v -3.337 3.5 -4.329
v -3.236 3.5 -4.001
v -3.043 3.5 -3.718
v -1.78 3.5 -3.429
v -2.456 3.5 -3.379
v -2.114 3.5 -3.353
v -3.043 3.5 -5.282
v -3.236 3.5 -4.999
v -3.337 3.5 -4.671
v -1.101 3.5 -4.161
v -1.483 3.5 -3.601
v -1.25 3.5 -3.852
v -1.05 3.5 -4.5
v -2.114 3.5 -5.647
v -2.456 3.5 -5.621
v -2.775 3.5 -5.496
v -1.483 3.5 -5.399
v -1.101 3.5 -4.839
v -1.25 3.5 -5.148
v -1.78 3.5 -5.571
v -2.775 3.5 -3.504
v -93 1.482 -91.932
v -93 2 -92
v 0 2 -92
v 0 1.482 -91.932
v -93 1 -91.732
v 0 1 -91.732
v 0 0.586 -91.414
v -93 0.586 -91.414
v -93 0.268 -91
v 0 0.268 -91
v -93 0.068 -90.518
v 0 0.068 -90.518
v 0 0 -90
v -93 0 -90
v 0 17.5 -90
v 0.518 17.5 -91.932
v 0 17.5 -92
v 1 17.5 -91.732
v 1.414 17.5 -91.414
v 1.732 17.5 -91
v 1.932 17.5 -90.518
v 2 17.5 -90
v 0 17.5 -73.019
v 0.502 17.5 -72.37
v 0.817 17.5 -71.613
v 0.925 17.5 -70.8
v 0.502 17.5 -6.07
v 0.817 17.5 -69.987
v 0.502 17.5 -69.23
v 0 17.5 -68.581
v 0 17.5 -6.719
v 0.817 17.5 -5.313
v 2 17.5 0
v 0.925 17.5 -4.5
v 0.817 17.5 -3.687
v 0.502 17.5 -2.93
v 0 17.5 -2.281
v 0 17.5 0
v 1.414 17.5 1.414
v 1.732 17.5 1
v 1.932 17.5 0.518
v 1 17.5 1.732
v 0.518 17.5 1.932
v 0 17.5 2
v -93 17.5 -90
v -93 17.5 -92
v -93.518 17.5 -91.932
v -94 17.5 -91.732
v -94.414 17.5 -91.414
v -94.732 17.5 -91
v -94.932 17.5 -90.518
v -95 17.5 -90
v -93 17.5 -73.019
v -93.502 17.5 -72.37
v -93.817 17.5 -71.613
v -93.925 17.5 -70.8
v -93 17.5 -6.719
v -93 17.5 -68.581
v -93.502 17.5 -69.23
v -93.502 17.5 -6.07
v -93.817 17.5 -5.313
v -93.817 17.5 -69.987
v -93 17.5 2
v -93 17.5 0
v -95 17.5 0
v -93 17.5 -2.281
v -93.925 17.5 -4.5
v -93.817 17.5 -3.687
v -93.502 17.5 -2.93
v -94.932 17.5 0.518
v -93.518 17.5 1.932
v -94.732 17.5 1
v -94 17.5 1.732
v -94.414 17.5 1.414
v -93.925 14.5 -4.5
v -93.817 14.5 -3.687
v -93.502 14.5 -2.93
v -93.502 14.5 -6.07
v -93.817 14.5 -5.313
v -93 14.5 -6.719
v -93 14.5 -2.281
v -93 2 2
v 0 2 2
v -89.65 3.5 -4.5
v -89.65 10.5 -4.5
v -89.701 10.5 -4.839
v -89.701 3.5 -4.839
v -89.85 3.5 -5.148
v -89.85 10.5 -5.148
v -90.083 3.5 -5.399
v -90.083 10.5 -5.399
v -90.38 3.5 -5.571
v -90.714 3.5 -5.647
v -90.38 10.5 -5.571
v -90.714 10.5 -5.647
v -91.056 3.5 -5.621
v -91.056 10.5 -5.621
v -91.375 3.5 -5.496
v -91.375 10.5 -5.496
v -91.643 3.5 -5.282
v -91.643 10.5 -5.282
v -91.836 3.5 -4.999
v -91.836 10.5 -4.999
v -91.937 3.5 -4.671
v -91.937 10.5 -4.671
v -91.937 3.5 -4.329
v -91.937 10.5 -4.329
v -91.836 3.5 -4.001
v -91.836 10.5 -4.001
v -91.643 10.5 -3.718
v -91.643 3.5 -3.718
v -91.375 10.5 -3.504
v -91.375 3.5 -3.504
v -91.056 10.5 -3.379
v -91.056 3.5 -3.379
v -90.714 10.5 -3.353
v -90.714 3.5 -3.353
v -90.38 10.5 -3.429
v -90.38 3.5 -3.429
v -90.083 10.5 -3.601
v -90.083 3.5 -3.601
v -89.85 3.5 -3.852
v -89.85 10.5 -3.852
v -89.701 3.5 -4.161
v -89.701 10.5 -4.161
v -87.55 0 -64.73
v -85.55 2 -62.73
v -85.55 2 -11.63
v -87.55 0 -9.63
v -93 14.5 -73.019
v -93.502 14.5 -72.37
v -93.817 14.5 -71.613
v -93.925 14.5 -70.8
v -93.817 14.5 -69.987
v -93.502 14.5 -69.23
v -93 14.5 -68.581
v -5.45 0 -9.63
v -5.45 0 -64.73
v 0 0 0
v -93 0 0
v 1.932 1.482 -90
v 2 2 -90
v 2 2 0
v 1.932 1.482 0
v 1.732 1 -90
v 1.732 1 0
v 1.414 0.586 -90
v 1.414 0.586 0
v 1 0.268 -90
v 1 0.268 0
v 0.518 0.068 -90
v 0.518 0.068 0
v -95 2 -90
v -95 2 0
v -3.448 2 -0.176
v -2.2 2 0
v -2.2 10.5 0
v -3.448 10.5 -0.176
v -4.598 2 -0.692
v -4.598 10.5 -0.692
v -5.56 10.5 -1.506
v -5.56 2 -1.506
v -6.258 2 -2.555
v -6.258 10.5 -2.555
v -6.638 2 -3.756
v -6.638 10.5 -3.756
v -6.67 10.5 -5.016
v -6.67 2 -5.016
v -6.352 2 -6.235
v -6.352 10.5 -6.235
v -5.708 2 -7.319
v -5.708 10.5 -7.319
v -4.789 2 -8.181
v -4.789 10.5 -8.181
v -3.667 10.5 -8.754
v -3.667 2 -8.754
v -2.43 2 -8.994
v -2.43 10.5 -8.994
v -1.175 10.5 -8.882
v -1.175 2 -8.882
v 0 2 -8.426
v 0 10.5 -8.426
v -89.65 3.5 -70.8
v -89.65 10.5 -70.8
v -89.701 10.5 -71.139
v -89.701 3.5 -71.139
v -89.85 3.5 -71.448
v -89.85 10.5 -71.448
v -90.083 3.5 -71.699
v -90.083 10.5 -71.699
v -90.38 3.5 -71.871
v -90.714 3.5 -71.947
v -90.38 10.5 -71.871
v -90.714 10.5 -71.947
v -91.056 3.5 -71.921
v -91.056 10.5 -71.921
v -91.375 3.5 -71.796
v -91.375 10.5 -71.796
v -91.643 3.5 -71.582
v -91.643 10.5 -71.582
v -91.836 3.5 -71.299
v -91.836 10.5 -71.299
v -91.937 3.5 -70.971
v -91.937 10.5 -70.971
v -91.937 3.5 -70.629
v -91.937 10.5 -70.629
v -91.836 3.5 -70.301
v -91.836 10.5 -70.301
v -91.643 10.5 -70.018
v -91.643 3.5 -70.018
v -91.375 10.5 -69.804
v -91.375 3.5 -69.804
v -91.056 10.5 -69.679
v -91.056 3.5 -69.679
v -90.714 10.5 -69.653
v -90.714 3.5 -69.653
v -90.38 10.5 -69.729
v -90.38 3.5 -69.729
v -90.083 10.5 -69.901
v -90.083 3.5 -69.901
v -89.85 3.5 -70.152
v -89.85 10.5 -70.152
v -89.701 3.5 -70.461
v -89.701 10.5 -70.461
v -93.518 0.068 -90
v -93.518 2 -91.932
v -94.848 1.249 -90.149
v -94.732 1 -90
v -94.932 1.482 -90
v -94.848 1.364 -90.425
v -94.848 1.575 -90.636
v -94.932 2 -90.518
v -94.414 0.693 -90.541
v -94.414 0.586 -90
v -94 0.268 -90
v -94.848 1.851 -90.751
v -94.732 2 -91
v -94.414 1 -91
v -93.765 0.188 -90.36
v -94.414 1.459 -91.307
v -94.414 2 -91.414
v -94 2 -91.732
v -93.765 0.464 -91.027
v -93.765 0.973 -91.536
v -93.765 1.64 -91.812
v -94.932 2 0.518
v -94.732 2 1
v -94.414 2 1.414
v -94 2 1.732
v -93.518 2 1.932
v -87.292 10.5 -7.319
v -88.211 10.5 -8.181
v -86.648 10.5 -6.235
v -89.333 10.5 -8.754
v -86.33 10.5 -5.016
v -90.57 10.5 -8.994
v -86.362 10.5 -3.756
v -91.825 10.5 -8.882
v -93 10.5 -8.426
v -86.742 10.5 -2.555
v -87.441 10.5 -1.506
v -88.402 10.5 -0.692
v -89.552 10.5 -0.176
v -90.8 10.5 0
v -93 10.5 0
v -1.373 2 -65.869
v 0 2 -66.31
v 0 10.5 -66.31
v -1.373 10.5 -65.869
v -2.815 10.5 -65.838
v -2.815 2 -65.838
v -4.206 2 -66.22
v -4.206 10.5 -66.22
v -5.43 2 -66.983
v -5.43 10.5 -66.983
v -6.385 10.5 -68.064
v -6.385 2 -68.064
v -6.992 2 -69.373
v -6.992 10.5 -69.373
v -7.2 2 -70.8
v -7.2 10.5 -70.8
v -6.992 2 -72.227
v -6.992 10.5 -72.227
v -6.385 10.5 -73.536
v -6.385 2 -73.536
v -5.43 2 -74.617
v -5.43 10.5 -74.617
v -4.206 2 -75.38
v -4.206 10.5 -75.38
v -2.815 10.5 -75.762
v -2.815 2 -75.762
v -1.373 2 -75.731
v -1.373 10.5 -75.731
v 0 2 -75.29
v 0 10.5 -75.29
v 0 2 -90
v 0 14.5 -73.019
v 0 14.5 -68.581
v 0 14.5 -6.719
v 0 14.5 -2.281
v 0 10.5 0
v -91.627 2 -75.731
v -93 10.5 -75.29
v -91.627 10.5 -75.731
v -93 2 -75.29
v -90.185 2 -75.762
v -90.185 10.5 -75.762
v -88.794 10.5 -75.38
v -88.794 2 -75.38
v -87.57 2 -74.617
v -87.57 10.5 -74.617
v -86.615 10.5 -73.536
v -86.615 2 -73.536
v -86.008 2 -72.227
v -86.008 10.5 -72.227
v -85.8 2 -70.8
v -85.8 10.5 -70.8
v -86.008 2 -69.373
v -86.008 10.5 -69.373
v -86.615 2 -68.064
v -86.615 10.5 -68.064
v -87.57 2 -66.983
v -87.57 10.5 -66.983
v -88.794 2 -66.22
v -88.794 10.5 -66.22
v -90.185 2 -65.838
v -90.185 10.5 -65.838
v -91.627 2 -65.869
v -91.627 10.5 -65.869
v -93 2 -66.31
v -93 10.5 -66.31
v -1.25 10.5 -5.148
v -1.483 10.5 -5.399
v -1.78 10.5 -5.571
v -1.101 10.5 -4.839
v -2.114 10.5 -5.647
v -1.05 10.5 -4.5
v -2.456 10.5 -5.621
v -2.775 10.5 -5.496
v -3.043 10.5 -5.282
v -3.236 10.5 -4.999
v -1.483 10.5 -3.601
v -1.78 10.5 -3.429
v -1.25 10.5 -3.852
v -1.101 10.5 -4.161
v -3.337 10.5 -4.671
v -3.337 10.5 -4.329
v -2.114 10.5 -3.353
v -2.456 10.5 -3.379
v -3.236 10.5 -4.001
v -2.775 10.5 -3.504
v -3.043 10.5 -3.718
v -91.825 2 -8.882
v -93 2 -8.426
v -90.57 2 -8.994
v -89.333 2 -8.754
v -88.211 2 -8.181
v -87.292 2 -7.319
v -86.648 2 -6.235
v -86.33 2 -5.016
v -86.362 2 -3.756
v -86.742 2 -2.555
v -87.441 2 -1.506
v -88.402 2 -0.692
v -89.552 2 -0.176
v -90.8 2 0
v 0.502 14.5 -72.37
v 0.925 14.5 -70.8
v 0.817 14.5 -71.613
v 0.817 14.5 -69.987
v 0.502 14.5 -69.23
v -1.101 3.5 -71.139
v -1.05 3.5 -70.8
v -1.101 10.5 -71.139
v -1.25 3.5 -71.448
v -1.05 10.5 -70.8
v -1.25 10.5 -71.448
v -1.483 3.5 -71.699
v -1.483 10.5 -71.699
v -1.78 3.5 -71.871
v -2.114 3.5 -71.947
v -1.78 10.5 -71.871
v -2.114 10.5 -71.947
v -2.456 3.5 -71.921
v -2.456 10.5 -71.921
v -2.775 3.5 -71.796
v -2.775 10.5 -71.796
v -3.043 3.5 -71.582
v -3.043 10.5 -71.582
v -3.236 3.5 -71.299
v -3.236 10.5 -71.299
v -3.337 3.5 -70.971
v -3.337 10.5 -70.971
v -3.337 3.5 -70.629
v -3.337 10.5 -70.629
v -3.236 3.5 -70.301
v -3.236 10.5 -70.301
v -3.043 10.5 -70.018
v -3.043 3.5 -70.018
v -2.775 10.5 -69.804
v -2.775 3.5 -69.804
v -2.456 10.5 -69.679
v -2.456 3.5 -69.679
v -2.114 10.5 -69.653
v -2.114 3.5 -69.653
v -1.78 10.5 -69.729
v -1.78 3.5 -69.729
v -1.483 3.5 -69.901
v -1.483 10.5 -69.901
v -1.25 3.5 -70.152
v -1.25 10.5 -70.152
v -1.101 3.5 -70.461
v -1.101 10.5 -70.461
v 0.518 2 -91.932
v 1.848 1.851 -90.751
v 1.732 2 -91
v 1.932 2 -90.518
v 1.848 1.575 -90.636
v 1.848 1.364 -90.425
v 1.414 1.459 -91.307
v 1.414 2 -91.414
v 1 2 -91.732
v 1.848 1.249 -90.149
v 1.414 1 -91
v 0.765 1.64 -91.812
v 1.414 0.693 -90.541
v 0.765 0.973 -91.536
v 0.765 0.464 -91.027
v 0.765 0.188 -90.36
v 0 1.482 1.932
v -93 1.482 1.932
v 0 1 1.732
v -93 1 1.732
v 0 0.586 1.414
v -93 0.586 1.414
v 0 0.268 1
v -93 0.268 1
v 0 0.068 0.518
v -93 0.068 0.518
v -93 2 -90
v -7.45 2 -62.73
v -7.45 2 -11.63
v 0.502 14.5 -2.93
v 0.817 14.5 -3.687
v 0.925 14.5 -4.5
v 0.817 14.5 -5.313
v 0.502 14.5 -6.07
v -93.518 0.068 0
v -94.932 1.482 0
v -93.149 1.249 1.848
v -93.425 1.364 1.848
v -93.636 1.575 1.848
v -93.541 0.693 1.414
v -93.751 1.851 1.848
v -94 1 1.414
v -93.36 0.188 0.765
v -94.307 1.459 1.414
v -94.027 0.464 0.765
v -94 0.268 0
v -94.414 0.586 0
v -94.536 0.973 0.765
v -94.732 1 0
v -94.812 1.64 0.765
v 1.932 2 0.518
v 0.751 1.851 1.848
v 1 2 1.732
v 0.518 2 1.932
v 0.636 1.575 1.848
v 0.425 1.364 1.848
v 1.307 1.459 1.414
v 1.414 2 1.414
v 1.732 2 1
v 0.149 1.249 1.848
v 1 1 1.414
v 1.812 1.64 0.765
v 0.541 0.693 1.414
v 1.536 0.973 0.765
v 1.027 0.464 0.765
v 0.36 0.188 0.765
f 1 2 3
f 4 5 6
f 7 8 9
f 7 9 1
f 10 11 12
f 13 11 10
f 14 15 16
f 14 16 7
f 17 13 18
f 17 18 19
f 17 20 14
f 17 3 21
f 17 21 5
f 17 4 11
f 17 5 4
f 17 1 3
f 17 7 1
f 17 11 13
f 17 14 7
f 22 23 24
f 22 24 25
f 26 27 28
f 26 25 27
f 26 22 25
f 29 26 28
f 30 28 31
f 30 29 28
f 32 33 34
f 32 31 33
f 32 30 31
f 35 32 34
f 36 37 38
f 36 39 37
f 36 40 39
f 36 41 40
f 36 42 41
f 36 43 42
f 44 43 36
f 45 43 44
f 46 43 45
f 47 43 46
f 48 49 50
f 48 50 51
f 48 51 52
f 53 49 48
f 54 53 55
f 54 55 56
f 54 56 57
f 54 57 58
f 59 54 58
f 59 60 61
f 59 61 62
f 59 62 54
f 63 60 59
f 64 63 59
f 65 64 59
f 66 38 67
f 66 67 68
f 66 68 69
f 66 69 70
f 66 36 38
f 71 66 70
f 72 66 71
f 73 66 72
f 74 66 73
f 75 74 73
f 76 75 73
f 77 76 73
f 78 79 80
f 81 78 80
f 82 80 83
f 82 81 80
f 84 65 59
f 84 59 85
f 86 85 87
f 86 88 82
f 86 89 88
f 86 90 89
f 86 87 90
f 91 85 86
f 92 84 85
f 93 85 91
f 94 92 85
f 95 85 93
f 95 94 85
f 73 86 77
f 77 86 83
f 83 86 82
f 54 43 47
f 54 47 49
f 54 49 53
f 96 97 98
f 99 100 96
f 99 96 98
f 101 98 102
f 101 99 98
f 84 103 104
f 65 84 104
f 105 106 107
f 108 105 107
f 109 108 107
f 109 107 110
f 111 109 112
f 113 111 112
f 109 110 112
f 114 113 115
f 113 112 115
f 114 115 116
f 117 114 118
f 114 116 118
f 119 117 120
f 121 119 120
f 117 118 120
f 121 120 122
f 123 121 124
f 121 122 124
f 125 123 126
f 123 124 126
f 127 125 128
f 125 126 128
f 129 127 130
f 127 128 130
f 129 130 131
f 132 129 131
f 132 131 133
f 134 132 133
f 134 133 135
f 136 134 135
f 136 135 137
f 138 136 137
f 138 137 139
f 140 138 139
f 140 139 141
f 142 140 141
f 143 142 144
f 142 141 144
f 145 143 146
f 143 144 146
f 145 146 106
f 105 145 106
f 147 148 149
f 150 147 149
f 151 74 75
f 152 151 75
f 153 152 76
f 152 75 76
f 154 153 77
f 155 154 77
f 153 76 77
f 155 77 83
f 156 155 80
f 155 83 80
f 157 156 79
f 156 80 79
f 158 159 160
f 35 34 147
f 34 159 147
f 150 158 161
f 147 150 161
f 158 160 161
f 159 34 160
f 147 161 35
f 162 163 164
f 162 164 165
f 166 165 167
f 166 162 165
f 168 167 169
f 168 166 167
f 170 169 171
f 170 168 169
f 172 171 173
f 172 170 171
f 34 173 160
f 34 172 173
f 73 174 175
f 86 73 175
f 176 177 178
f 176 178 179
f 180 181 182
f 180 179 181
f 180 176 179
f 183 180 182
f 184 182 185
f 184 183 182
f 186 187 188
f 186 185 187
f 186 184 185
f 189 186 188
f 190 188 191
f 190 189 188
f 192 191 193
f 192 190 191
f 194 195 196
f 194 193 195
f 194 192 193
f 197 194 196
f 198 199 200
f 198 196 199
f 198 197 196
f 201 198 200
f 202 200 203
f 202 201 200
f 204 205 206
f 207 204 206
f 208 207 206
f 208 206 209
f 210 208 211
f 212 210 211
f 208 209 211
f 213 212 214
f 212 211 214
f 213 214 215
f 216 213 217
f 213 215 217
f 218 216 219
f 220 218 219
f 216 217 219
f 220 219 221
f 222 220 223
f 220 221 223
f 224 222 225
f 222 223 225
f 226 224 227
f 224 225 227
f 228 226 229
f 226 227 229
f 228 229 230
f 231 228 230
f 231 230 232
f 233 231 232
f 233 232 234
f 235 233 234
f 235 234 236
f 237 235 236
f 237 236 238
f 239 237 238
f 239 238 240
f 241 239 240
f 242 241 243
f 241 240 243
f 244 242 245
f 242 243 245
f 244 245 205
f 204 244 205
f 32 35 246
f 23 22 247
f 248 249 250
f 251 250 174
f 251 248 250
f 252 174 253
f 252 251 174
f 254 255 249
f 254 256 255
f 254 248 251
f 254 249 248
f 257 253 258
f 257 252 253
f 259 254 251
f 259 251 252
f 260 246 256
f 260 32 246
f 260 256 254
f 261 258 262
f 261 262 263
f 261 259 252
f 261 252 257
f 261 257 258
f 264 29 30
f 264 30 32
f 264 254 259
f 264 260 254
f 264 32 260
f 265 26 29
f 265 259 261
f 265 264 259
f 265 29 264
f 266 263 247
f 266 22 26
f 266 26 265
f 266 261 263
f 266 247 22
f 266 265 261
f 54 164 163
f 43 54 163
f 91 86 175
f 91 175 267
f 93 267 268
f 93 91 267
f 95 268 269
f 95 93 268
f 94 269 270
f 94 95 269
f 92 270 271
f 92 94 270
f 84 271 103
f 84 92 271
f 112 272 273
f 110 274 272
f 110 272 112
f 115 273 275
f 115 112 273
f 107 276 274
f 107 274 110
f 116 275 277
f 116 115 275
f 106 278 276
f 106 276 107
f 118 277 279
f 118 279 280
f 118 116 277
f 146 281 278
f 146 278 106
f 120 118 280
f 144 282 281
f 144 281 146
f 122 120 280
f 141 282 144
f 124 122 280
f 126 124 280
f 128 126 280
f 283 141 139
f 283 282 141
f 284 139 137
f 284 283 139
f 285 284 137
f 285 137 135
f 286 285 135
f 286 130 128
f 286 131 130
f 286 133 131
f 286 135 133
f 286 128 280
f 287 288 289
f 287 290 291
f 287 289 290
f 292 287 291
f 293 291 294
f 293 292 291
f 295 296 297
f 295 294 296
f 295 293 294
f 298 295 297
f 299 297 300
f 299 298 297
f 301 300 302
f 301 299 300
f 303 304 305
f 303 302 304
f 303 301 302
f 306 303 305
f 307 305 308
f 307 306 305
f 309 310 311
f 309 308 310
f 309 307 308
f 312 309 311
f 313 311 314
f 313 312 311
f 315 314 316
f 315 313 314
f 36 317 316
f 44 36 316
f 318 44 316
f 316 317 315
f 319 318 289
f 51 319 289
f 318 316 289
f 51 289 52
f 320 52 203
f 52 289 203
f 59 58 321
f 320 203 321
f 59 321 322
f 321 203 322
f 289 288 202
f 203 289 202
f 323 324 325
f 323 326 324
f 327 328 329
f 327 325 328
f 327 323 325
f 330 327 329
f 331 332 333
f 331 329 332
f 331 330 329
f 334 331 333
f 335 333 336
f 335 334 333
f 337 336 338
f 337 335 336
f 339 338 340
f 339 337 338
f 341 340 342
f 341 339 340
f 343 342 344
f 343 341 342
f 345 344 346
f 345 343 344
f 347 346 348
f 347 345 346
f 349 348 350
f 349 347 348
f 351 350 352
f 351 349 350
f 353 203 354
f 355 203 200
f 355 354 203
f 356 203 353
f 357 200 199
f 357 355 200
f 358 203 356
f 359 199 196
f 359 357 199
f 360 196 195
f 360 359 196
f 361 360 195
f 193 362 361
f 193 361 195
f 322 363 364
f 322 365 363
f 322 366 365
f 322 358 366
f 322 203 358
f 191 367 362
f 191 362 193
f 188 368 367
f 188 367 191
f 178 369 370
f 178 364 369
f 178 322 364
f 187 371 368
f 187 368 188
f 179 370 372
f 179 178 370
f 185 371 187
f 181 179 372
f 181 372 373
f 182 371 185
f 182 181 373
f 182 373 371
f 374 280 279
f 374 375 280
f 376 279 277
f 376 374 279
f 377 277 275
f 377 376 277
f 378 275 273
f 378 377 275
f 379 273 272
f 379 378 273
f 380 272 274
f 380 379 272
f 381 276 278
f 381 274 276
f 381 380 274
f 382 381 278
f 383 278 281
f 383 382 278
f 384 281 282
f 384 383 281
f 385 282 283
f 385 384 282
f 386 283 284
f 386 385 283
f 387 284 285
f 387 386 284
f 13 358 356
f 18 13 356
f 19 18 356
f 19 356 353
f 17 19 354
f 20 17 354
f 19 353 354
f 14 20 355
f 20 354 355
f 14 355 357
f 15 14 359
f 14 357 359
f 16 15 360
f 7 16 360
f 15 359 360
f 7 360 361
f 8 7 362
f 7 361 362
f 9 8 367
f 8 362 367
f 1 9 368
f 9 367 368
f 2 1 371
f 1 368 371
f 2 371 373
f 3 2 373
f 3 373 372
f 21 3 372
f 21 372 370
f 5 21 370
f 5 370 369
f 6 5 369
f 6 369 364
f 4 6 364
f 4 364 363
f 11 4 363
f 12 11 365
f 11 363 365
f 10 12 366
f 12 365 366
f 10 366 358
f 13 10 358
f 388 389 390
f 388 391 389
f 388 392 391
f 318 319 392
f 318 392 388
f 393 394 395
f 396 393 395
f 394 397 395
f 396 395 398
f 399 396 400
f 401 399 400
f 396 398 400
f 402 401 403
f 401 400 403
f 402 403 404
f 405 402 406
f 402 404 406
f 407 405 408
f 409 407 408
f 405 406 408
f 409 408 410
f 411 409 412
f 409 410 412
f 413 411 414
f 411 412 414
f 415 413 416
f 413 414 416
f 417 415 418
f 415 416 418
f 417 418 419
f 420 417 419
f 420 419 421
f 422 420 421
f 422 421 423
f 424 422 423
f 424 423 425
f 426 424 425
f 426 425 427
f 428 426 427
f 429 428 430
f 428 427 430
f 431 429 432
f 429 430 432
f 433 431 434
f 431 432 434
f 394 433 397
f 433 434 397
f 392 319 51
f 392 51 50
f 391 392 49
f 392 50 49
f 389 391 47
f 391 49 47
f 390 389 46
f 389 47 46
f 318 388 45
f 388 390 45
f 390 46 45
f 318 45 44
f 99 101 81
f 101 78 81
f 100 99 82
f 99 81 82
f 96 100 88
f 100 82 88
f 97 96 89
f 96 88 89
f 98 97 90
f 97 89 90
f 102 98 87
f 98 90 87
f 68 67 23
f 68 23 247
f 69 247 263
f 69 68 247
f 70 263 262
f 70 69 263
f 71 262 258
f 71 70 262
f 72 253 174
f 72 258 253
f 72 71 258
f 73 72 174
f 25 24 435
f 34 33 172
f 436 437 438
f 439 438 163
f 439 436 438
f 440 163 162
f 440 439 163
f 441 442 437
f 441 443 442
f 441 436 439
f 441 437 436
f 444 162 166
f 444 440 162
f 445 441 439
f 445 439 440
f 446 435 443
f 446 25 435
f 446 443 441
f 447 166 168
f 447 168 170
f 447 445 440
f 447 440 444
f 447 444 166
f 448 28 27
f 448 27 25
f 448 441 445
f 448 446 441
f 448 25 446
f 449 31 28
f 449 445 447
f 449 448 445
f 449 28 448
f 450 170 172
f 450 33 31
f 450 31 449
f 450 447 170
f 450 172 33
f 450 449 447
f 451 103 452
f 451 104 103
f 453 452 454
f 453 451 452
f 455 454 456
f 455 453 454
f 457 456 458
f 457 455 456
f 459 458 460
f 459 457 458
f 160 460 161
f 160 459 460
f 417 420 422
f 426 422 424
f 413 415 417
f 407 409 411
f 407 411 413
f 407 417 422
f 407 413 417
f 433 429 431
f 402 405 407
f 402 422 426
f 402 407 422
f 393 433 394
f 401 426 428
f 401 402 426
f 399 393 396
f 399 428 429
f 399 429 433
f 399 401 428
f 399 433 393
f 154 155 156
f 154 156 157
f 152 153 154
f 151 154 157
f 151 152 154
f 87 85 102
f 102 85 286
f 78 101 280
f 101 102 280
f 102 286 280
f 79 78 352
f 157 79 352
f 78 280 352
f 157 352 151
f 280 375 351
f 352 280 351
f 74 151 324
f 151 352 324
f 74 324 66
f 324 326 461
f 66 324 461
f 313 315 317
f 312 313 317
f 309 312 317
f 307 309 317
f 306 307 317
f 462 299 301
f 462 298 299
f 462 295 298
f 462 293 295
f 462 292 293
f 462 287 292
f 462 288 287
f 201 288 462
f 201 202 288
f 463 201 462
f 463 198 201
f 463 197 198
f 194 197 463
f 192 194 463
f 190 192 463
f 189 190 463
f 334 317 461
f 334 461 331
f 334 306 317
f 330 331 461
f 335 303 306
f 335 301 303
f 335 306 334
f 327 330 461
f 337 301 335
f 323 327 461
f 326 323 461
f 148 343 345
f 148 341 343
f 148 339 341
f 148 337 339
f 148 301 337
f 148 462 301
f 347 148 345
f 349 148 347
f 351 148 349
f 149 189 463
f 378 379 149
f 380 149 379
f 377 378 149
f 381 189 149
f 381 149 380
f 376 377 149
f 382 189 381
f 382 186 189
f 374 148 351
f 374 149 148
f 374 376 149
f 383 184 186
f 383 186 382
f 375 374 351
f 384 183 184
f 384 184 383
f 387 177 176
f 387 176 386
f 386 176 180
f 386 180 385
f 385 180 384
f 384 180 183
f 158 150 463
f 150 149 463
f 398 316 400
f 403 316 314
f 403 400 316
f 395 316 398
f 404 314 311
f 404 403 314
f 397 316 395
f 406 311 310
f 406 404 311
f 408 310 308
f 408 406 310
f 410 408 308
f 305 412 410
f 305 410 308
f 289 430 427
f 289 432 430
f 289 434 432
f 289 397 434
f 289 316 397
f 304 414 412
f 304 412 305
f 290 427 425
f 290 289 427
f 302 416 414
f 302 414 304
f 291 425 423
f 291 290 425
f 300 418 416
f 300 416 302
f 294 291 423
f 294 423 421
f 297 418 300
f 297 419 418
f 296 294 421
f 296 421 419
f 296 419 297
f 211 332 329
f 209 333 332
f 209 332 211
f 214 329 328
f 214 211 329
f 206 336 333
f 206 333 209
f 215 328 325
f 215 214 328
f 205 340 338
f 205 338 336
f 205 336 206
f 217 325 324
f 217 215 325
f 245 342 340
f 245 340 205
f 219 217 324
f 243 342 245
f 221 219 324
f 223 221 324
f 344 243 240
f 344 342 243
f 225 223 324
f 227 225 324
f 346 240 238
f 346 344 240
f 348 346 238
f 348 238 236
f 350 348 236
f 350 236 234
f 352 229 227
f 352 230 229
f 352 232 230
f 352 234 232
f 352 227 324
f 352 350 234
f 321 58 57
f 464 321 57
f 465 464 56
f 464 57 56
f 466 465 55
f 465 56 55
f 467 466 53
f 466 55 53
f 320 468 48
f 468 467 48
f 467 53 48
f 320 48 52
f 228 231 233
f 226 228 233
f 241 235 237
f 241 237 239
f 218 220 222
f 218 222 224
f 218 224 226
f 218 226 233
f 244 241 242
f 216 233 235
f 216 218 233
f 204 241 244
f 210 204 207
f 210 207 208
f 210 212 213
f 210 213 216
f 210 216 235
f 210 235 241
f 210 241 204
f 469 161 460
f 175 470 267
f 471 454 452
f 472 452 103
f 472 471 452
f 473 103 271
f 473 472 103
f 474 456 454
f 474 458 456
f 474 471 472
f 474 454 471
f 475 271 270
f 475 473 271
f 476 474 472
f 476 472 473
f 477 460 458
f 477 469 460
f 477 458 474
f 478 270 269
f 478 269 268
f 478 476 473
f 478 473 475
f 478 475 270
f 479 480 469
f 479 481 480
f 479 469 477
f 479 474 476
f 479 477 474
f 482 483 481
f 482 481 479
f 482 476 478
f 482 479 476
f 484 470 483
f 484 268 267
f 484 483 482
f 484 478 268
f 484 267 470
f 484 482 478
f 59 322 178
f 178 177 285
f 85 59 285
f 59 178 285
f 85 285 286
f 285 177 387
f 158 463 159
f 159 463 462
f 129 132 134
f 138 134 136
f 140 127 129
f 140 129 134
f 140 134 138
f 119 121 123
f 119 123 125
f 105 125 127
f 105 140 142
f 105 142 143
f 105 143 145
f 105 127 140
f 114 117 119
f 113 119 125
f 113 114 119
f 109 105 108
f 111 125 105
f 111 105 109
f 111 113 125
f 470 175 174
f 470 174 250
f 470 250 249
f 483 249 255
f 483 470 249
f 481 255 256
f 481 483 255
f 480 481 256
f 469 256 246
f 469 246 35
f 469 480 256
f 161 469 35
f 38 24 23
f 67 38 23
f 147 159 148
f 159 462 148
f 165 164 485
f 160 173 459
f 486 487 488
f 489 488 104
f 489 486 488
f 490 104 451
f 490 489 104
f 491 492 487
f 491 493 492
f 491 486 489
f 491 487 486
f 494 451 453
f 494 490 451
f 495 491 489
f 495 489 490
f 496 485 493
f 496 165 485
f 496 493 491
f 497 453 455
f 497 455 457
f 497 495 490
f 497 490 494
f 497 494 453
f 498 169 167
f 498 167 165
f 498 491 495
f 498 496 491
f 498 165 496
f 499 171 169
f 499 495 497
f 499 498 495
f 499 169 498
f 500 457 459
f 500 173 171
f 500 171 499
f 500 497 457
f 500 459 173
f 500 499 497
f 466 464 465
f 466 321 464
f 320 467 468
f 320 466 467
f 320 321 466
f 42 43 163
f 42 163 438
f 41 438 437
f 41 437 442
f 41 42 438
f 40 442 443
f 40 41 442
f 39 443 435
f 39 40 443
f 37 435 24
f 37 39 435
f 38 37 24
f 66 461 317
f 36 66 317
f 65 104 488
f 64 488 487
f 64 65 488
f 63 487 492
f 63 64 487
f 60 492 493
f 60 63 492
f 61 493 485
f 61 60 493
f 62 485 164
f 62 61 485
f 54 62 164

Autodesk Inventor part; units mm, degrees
ref_plane "YZ Plane" through (0, 0, 0) normal (1, 0, 0) x (0, 1, 0)
ref_plane "XZ Plane" through (0, 0, 0) normal (0, 1, 0) x (-1, 0, 0)
ref_plane "XY Plane" through (0, 0, 0) normal (0, 0, 1) x (1, 0, 0)
sketch "Sketch1" plane through (0, 0, 0) normal (0, 1, 0) x (-1, 0, 0)
  line L0 (0, 0) -> (93, 0)
  line L1 (93, 0) -> (93, -90)
  line L2 (93, -90) -> (0, -90)
  line L3 (0, -90) -> (0, 0)
  line L4 (95, -92) -> (95, 2)
  line L5 (95, 2) -> (-2, 2)
  line L6 (-2, 2) -> (-2, -92)
  line L7 (-2, -92) -> (95, -92)
  line L8 (85.55, -11.63) -> (7.45, -11.63)
  line L9 (7.45, -11.63) -> (7.45, -62.73)
  line L10 (7.45, -62.73) -> (85.55, -62.73)
  line L11 (85.55, -62.73) -> (85.55, -11.63)
  line L12 (82.5, -17.18) -> (10.5, -17.18)
  line L13 (10.5, -17.18) -> (10.5, -57.18)
  line L14 (10.5, -57.18) -> (82.5, -57.18)
  line L15 (82.5, -57.18) -> (82.5, -17.18)
  arc A0 (90.8, 0) -> (93, -8.4256) centre (90.8, -4.5) ccw
  arc A1 (0, -8.4256) -> (2.2, 0) centre (2.2, -4.5) ccw
  arc A2 (93, -66.31) -> (93, -75.29) centre (90.8, -70.8) ccw
  arc A3 (0, -75.29) -> (0, -66.31) centre (2.2, -70.8) ccw
  point P0 (10.5, -37.18)
  point P1 (7.45, -37.18)
  point P2 (46.5, -62.73)
  point P3 (46.5, -57.18)
  dimension "d0" = 93
  dimension "d1" = 90
  dimension "d2" = 2
  dimension "d7" = 78.1
  dimension "d8" = 51.1
  dimension "d9" = 72
  dimension "d10" = 40
extrude "Extrusion1" add sketch "Sketch1" along normal blind 2 contours L0 A0 L1 A2 L2 L3 A3 A1
extrude "Extrusion2" add sketch "Sketch1" along normal blind 10.5 contours L0 A1 L3 | L0 L1 A0 | A3 L3 | L1 A2
extrude "Extrusion3" add sketch "Sketch1" along normal blind 17.5 contours L7 L6 L5 L4
chamfer "Chamfer1" distance 2 angle 45 4 edges at (-46.5, 0, -11.63) (-85.55, 0, -37.18) (-7.45, 0, -37.18) (-46.5, 0, -62.73)
fillet "Fillet1" radius 2 8 edges at (-46.5, 0, -92) (2, 0, -45) (2, 8.75, -92) (-95, 8.75, -92) (-95, 0, -45) (-46.5, 0, 2) (-95, 8.75, 2) (2, 8.75, 2)
sketch "Sketch2" plane through (0, 10.5, 0) normal (0, 1, 0) x (1, 0, 0)
  circle A0 centre (-90.8, 4.5) radius 1.15
  circle A1 centre (-90.8, 70.8) radius 1.15
  circle A2 centre (-2.2, 70.8) radius 1.15
  circle A3 centre (-2.2, 4.5) radius 1.15
  point P0 (0, 0)
  dimension "d26" = 2.3
  dimension "d27" = 2.3
  dimension "d28" = 2.3
  dimension "d29" = 2.3
extrude "Extrusion4" cut sketch "Sketch2" against normal blind 7
sketch "Sketch3" plane through (0, 17.5, 0) normal (0, 1, 0) x (1, 0, 0)
  circle A0 centre (-2.2, 4.5) radius 1.15 projected
  circle A1 centre (-90.8, 4.5) radius 1.15 projected
  circle A2 centre (-90.8, 70.8) radius 1.15 projected
  circle A3 centre (-2.2, 70.8) radius 1.15 projected
  circle A4 centre (-90.8, 70.8) radius 3.125
  circle A5 centre (-90.8, 4.5) radius 3.125
  circle A6 centre (-2.2, 4.5) radius 3.125
  circle A7 centre (-2.2, 70.8) radius 3.125
  point P0 (0, 0)
  dimension "d32" = 6.25
  dimension "d33" = 6.25
  dimension "d34" = 6.25
  dimension "d35" = 6.25
extrude "Extrusion5" cut sketch "Sketch3" against normal blind 3 contours A0 | A1 | A2 | A3 | A4 | A5 | A6 | A7
properties part number "caseFront"
